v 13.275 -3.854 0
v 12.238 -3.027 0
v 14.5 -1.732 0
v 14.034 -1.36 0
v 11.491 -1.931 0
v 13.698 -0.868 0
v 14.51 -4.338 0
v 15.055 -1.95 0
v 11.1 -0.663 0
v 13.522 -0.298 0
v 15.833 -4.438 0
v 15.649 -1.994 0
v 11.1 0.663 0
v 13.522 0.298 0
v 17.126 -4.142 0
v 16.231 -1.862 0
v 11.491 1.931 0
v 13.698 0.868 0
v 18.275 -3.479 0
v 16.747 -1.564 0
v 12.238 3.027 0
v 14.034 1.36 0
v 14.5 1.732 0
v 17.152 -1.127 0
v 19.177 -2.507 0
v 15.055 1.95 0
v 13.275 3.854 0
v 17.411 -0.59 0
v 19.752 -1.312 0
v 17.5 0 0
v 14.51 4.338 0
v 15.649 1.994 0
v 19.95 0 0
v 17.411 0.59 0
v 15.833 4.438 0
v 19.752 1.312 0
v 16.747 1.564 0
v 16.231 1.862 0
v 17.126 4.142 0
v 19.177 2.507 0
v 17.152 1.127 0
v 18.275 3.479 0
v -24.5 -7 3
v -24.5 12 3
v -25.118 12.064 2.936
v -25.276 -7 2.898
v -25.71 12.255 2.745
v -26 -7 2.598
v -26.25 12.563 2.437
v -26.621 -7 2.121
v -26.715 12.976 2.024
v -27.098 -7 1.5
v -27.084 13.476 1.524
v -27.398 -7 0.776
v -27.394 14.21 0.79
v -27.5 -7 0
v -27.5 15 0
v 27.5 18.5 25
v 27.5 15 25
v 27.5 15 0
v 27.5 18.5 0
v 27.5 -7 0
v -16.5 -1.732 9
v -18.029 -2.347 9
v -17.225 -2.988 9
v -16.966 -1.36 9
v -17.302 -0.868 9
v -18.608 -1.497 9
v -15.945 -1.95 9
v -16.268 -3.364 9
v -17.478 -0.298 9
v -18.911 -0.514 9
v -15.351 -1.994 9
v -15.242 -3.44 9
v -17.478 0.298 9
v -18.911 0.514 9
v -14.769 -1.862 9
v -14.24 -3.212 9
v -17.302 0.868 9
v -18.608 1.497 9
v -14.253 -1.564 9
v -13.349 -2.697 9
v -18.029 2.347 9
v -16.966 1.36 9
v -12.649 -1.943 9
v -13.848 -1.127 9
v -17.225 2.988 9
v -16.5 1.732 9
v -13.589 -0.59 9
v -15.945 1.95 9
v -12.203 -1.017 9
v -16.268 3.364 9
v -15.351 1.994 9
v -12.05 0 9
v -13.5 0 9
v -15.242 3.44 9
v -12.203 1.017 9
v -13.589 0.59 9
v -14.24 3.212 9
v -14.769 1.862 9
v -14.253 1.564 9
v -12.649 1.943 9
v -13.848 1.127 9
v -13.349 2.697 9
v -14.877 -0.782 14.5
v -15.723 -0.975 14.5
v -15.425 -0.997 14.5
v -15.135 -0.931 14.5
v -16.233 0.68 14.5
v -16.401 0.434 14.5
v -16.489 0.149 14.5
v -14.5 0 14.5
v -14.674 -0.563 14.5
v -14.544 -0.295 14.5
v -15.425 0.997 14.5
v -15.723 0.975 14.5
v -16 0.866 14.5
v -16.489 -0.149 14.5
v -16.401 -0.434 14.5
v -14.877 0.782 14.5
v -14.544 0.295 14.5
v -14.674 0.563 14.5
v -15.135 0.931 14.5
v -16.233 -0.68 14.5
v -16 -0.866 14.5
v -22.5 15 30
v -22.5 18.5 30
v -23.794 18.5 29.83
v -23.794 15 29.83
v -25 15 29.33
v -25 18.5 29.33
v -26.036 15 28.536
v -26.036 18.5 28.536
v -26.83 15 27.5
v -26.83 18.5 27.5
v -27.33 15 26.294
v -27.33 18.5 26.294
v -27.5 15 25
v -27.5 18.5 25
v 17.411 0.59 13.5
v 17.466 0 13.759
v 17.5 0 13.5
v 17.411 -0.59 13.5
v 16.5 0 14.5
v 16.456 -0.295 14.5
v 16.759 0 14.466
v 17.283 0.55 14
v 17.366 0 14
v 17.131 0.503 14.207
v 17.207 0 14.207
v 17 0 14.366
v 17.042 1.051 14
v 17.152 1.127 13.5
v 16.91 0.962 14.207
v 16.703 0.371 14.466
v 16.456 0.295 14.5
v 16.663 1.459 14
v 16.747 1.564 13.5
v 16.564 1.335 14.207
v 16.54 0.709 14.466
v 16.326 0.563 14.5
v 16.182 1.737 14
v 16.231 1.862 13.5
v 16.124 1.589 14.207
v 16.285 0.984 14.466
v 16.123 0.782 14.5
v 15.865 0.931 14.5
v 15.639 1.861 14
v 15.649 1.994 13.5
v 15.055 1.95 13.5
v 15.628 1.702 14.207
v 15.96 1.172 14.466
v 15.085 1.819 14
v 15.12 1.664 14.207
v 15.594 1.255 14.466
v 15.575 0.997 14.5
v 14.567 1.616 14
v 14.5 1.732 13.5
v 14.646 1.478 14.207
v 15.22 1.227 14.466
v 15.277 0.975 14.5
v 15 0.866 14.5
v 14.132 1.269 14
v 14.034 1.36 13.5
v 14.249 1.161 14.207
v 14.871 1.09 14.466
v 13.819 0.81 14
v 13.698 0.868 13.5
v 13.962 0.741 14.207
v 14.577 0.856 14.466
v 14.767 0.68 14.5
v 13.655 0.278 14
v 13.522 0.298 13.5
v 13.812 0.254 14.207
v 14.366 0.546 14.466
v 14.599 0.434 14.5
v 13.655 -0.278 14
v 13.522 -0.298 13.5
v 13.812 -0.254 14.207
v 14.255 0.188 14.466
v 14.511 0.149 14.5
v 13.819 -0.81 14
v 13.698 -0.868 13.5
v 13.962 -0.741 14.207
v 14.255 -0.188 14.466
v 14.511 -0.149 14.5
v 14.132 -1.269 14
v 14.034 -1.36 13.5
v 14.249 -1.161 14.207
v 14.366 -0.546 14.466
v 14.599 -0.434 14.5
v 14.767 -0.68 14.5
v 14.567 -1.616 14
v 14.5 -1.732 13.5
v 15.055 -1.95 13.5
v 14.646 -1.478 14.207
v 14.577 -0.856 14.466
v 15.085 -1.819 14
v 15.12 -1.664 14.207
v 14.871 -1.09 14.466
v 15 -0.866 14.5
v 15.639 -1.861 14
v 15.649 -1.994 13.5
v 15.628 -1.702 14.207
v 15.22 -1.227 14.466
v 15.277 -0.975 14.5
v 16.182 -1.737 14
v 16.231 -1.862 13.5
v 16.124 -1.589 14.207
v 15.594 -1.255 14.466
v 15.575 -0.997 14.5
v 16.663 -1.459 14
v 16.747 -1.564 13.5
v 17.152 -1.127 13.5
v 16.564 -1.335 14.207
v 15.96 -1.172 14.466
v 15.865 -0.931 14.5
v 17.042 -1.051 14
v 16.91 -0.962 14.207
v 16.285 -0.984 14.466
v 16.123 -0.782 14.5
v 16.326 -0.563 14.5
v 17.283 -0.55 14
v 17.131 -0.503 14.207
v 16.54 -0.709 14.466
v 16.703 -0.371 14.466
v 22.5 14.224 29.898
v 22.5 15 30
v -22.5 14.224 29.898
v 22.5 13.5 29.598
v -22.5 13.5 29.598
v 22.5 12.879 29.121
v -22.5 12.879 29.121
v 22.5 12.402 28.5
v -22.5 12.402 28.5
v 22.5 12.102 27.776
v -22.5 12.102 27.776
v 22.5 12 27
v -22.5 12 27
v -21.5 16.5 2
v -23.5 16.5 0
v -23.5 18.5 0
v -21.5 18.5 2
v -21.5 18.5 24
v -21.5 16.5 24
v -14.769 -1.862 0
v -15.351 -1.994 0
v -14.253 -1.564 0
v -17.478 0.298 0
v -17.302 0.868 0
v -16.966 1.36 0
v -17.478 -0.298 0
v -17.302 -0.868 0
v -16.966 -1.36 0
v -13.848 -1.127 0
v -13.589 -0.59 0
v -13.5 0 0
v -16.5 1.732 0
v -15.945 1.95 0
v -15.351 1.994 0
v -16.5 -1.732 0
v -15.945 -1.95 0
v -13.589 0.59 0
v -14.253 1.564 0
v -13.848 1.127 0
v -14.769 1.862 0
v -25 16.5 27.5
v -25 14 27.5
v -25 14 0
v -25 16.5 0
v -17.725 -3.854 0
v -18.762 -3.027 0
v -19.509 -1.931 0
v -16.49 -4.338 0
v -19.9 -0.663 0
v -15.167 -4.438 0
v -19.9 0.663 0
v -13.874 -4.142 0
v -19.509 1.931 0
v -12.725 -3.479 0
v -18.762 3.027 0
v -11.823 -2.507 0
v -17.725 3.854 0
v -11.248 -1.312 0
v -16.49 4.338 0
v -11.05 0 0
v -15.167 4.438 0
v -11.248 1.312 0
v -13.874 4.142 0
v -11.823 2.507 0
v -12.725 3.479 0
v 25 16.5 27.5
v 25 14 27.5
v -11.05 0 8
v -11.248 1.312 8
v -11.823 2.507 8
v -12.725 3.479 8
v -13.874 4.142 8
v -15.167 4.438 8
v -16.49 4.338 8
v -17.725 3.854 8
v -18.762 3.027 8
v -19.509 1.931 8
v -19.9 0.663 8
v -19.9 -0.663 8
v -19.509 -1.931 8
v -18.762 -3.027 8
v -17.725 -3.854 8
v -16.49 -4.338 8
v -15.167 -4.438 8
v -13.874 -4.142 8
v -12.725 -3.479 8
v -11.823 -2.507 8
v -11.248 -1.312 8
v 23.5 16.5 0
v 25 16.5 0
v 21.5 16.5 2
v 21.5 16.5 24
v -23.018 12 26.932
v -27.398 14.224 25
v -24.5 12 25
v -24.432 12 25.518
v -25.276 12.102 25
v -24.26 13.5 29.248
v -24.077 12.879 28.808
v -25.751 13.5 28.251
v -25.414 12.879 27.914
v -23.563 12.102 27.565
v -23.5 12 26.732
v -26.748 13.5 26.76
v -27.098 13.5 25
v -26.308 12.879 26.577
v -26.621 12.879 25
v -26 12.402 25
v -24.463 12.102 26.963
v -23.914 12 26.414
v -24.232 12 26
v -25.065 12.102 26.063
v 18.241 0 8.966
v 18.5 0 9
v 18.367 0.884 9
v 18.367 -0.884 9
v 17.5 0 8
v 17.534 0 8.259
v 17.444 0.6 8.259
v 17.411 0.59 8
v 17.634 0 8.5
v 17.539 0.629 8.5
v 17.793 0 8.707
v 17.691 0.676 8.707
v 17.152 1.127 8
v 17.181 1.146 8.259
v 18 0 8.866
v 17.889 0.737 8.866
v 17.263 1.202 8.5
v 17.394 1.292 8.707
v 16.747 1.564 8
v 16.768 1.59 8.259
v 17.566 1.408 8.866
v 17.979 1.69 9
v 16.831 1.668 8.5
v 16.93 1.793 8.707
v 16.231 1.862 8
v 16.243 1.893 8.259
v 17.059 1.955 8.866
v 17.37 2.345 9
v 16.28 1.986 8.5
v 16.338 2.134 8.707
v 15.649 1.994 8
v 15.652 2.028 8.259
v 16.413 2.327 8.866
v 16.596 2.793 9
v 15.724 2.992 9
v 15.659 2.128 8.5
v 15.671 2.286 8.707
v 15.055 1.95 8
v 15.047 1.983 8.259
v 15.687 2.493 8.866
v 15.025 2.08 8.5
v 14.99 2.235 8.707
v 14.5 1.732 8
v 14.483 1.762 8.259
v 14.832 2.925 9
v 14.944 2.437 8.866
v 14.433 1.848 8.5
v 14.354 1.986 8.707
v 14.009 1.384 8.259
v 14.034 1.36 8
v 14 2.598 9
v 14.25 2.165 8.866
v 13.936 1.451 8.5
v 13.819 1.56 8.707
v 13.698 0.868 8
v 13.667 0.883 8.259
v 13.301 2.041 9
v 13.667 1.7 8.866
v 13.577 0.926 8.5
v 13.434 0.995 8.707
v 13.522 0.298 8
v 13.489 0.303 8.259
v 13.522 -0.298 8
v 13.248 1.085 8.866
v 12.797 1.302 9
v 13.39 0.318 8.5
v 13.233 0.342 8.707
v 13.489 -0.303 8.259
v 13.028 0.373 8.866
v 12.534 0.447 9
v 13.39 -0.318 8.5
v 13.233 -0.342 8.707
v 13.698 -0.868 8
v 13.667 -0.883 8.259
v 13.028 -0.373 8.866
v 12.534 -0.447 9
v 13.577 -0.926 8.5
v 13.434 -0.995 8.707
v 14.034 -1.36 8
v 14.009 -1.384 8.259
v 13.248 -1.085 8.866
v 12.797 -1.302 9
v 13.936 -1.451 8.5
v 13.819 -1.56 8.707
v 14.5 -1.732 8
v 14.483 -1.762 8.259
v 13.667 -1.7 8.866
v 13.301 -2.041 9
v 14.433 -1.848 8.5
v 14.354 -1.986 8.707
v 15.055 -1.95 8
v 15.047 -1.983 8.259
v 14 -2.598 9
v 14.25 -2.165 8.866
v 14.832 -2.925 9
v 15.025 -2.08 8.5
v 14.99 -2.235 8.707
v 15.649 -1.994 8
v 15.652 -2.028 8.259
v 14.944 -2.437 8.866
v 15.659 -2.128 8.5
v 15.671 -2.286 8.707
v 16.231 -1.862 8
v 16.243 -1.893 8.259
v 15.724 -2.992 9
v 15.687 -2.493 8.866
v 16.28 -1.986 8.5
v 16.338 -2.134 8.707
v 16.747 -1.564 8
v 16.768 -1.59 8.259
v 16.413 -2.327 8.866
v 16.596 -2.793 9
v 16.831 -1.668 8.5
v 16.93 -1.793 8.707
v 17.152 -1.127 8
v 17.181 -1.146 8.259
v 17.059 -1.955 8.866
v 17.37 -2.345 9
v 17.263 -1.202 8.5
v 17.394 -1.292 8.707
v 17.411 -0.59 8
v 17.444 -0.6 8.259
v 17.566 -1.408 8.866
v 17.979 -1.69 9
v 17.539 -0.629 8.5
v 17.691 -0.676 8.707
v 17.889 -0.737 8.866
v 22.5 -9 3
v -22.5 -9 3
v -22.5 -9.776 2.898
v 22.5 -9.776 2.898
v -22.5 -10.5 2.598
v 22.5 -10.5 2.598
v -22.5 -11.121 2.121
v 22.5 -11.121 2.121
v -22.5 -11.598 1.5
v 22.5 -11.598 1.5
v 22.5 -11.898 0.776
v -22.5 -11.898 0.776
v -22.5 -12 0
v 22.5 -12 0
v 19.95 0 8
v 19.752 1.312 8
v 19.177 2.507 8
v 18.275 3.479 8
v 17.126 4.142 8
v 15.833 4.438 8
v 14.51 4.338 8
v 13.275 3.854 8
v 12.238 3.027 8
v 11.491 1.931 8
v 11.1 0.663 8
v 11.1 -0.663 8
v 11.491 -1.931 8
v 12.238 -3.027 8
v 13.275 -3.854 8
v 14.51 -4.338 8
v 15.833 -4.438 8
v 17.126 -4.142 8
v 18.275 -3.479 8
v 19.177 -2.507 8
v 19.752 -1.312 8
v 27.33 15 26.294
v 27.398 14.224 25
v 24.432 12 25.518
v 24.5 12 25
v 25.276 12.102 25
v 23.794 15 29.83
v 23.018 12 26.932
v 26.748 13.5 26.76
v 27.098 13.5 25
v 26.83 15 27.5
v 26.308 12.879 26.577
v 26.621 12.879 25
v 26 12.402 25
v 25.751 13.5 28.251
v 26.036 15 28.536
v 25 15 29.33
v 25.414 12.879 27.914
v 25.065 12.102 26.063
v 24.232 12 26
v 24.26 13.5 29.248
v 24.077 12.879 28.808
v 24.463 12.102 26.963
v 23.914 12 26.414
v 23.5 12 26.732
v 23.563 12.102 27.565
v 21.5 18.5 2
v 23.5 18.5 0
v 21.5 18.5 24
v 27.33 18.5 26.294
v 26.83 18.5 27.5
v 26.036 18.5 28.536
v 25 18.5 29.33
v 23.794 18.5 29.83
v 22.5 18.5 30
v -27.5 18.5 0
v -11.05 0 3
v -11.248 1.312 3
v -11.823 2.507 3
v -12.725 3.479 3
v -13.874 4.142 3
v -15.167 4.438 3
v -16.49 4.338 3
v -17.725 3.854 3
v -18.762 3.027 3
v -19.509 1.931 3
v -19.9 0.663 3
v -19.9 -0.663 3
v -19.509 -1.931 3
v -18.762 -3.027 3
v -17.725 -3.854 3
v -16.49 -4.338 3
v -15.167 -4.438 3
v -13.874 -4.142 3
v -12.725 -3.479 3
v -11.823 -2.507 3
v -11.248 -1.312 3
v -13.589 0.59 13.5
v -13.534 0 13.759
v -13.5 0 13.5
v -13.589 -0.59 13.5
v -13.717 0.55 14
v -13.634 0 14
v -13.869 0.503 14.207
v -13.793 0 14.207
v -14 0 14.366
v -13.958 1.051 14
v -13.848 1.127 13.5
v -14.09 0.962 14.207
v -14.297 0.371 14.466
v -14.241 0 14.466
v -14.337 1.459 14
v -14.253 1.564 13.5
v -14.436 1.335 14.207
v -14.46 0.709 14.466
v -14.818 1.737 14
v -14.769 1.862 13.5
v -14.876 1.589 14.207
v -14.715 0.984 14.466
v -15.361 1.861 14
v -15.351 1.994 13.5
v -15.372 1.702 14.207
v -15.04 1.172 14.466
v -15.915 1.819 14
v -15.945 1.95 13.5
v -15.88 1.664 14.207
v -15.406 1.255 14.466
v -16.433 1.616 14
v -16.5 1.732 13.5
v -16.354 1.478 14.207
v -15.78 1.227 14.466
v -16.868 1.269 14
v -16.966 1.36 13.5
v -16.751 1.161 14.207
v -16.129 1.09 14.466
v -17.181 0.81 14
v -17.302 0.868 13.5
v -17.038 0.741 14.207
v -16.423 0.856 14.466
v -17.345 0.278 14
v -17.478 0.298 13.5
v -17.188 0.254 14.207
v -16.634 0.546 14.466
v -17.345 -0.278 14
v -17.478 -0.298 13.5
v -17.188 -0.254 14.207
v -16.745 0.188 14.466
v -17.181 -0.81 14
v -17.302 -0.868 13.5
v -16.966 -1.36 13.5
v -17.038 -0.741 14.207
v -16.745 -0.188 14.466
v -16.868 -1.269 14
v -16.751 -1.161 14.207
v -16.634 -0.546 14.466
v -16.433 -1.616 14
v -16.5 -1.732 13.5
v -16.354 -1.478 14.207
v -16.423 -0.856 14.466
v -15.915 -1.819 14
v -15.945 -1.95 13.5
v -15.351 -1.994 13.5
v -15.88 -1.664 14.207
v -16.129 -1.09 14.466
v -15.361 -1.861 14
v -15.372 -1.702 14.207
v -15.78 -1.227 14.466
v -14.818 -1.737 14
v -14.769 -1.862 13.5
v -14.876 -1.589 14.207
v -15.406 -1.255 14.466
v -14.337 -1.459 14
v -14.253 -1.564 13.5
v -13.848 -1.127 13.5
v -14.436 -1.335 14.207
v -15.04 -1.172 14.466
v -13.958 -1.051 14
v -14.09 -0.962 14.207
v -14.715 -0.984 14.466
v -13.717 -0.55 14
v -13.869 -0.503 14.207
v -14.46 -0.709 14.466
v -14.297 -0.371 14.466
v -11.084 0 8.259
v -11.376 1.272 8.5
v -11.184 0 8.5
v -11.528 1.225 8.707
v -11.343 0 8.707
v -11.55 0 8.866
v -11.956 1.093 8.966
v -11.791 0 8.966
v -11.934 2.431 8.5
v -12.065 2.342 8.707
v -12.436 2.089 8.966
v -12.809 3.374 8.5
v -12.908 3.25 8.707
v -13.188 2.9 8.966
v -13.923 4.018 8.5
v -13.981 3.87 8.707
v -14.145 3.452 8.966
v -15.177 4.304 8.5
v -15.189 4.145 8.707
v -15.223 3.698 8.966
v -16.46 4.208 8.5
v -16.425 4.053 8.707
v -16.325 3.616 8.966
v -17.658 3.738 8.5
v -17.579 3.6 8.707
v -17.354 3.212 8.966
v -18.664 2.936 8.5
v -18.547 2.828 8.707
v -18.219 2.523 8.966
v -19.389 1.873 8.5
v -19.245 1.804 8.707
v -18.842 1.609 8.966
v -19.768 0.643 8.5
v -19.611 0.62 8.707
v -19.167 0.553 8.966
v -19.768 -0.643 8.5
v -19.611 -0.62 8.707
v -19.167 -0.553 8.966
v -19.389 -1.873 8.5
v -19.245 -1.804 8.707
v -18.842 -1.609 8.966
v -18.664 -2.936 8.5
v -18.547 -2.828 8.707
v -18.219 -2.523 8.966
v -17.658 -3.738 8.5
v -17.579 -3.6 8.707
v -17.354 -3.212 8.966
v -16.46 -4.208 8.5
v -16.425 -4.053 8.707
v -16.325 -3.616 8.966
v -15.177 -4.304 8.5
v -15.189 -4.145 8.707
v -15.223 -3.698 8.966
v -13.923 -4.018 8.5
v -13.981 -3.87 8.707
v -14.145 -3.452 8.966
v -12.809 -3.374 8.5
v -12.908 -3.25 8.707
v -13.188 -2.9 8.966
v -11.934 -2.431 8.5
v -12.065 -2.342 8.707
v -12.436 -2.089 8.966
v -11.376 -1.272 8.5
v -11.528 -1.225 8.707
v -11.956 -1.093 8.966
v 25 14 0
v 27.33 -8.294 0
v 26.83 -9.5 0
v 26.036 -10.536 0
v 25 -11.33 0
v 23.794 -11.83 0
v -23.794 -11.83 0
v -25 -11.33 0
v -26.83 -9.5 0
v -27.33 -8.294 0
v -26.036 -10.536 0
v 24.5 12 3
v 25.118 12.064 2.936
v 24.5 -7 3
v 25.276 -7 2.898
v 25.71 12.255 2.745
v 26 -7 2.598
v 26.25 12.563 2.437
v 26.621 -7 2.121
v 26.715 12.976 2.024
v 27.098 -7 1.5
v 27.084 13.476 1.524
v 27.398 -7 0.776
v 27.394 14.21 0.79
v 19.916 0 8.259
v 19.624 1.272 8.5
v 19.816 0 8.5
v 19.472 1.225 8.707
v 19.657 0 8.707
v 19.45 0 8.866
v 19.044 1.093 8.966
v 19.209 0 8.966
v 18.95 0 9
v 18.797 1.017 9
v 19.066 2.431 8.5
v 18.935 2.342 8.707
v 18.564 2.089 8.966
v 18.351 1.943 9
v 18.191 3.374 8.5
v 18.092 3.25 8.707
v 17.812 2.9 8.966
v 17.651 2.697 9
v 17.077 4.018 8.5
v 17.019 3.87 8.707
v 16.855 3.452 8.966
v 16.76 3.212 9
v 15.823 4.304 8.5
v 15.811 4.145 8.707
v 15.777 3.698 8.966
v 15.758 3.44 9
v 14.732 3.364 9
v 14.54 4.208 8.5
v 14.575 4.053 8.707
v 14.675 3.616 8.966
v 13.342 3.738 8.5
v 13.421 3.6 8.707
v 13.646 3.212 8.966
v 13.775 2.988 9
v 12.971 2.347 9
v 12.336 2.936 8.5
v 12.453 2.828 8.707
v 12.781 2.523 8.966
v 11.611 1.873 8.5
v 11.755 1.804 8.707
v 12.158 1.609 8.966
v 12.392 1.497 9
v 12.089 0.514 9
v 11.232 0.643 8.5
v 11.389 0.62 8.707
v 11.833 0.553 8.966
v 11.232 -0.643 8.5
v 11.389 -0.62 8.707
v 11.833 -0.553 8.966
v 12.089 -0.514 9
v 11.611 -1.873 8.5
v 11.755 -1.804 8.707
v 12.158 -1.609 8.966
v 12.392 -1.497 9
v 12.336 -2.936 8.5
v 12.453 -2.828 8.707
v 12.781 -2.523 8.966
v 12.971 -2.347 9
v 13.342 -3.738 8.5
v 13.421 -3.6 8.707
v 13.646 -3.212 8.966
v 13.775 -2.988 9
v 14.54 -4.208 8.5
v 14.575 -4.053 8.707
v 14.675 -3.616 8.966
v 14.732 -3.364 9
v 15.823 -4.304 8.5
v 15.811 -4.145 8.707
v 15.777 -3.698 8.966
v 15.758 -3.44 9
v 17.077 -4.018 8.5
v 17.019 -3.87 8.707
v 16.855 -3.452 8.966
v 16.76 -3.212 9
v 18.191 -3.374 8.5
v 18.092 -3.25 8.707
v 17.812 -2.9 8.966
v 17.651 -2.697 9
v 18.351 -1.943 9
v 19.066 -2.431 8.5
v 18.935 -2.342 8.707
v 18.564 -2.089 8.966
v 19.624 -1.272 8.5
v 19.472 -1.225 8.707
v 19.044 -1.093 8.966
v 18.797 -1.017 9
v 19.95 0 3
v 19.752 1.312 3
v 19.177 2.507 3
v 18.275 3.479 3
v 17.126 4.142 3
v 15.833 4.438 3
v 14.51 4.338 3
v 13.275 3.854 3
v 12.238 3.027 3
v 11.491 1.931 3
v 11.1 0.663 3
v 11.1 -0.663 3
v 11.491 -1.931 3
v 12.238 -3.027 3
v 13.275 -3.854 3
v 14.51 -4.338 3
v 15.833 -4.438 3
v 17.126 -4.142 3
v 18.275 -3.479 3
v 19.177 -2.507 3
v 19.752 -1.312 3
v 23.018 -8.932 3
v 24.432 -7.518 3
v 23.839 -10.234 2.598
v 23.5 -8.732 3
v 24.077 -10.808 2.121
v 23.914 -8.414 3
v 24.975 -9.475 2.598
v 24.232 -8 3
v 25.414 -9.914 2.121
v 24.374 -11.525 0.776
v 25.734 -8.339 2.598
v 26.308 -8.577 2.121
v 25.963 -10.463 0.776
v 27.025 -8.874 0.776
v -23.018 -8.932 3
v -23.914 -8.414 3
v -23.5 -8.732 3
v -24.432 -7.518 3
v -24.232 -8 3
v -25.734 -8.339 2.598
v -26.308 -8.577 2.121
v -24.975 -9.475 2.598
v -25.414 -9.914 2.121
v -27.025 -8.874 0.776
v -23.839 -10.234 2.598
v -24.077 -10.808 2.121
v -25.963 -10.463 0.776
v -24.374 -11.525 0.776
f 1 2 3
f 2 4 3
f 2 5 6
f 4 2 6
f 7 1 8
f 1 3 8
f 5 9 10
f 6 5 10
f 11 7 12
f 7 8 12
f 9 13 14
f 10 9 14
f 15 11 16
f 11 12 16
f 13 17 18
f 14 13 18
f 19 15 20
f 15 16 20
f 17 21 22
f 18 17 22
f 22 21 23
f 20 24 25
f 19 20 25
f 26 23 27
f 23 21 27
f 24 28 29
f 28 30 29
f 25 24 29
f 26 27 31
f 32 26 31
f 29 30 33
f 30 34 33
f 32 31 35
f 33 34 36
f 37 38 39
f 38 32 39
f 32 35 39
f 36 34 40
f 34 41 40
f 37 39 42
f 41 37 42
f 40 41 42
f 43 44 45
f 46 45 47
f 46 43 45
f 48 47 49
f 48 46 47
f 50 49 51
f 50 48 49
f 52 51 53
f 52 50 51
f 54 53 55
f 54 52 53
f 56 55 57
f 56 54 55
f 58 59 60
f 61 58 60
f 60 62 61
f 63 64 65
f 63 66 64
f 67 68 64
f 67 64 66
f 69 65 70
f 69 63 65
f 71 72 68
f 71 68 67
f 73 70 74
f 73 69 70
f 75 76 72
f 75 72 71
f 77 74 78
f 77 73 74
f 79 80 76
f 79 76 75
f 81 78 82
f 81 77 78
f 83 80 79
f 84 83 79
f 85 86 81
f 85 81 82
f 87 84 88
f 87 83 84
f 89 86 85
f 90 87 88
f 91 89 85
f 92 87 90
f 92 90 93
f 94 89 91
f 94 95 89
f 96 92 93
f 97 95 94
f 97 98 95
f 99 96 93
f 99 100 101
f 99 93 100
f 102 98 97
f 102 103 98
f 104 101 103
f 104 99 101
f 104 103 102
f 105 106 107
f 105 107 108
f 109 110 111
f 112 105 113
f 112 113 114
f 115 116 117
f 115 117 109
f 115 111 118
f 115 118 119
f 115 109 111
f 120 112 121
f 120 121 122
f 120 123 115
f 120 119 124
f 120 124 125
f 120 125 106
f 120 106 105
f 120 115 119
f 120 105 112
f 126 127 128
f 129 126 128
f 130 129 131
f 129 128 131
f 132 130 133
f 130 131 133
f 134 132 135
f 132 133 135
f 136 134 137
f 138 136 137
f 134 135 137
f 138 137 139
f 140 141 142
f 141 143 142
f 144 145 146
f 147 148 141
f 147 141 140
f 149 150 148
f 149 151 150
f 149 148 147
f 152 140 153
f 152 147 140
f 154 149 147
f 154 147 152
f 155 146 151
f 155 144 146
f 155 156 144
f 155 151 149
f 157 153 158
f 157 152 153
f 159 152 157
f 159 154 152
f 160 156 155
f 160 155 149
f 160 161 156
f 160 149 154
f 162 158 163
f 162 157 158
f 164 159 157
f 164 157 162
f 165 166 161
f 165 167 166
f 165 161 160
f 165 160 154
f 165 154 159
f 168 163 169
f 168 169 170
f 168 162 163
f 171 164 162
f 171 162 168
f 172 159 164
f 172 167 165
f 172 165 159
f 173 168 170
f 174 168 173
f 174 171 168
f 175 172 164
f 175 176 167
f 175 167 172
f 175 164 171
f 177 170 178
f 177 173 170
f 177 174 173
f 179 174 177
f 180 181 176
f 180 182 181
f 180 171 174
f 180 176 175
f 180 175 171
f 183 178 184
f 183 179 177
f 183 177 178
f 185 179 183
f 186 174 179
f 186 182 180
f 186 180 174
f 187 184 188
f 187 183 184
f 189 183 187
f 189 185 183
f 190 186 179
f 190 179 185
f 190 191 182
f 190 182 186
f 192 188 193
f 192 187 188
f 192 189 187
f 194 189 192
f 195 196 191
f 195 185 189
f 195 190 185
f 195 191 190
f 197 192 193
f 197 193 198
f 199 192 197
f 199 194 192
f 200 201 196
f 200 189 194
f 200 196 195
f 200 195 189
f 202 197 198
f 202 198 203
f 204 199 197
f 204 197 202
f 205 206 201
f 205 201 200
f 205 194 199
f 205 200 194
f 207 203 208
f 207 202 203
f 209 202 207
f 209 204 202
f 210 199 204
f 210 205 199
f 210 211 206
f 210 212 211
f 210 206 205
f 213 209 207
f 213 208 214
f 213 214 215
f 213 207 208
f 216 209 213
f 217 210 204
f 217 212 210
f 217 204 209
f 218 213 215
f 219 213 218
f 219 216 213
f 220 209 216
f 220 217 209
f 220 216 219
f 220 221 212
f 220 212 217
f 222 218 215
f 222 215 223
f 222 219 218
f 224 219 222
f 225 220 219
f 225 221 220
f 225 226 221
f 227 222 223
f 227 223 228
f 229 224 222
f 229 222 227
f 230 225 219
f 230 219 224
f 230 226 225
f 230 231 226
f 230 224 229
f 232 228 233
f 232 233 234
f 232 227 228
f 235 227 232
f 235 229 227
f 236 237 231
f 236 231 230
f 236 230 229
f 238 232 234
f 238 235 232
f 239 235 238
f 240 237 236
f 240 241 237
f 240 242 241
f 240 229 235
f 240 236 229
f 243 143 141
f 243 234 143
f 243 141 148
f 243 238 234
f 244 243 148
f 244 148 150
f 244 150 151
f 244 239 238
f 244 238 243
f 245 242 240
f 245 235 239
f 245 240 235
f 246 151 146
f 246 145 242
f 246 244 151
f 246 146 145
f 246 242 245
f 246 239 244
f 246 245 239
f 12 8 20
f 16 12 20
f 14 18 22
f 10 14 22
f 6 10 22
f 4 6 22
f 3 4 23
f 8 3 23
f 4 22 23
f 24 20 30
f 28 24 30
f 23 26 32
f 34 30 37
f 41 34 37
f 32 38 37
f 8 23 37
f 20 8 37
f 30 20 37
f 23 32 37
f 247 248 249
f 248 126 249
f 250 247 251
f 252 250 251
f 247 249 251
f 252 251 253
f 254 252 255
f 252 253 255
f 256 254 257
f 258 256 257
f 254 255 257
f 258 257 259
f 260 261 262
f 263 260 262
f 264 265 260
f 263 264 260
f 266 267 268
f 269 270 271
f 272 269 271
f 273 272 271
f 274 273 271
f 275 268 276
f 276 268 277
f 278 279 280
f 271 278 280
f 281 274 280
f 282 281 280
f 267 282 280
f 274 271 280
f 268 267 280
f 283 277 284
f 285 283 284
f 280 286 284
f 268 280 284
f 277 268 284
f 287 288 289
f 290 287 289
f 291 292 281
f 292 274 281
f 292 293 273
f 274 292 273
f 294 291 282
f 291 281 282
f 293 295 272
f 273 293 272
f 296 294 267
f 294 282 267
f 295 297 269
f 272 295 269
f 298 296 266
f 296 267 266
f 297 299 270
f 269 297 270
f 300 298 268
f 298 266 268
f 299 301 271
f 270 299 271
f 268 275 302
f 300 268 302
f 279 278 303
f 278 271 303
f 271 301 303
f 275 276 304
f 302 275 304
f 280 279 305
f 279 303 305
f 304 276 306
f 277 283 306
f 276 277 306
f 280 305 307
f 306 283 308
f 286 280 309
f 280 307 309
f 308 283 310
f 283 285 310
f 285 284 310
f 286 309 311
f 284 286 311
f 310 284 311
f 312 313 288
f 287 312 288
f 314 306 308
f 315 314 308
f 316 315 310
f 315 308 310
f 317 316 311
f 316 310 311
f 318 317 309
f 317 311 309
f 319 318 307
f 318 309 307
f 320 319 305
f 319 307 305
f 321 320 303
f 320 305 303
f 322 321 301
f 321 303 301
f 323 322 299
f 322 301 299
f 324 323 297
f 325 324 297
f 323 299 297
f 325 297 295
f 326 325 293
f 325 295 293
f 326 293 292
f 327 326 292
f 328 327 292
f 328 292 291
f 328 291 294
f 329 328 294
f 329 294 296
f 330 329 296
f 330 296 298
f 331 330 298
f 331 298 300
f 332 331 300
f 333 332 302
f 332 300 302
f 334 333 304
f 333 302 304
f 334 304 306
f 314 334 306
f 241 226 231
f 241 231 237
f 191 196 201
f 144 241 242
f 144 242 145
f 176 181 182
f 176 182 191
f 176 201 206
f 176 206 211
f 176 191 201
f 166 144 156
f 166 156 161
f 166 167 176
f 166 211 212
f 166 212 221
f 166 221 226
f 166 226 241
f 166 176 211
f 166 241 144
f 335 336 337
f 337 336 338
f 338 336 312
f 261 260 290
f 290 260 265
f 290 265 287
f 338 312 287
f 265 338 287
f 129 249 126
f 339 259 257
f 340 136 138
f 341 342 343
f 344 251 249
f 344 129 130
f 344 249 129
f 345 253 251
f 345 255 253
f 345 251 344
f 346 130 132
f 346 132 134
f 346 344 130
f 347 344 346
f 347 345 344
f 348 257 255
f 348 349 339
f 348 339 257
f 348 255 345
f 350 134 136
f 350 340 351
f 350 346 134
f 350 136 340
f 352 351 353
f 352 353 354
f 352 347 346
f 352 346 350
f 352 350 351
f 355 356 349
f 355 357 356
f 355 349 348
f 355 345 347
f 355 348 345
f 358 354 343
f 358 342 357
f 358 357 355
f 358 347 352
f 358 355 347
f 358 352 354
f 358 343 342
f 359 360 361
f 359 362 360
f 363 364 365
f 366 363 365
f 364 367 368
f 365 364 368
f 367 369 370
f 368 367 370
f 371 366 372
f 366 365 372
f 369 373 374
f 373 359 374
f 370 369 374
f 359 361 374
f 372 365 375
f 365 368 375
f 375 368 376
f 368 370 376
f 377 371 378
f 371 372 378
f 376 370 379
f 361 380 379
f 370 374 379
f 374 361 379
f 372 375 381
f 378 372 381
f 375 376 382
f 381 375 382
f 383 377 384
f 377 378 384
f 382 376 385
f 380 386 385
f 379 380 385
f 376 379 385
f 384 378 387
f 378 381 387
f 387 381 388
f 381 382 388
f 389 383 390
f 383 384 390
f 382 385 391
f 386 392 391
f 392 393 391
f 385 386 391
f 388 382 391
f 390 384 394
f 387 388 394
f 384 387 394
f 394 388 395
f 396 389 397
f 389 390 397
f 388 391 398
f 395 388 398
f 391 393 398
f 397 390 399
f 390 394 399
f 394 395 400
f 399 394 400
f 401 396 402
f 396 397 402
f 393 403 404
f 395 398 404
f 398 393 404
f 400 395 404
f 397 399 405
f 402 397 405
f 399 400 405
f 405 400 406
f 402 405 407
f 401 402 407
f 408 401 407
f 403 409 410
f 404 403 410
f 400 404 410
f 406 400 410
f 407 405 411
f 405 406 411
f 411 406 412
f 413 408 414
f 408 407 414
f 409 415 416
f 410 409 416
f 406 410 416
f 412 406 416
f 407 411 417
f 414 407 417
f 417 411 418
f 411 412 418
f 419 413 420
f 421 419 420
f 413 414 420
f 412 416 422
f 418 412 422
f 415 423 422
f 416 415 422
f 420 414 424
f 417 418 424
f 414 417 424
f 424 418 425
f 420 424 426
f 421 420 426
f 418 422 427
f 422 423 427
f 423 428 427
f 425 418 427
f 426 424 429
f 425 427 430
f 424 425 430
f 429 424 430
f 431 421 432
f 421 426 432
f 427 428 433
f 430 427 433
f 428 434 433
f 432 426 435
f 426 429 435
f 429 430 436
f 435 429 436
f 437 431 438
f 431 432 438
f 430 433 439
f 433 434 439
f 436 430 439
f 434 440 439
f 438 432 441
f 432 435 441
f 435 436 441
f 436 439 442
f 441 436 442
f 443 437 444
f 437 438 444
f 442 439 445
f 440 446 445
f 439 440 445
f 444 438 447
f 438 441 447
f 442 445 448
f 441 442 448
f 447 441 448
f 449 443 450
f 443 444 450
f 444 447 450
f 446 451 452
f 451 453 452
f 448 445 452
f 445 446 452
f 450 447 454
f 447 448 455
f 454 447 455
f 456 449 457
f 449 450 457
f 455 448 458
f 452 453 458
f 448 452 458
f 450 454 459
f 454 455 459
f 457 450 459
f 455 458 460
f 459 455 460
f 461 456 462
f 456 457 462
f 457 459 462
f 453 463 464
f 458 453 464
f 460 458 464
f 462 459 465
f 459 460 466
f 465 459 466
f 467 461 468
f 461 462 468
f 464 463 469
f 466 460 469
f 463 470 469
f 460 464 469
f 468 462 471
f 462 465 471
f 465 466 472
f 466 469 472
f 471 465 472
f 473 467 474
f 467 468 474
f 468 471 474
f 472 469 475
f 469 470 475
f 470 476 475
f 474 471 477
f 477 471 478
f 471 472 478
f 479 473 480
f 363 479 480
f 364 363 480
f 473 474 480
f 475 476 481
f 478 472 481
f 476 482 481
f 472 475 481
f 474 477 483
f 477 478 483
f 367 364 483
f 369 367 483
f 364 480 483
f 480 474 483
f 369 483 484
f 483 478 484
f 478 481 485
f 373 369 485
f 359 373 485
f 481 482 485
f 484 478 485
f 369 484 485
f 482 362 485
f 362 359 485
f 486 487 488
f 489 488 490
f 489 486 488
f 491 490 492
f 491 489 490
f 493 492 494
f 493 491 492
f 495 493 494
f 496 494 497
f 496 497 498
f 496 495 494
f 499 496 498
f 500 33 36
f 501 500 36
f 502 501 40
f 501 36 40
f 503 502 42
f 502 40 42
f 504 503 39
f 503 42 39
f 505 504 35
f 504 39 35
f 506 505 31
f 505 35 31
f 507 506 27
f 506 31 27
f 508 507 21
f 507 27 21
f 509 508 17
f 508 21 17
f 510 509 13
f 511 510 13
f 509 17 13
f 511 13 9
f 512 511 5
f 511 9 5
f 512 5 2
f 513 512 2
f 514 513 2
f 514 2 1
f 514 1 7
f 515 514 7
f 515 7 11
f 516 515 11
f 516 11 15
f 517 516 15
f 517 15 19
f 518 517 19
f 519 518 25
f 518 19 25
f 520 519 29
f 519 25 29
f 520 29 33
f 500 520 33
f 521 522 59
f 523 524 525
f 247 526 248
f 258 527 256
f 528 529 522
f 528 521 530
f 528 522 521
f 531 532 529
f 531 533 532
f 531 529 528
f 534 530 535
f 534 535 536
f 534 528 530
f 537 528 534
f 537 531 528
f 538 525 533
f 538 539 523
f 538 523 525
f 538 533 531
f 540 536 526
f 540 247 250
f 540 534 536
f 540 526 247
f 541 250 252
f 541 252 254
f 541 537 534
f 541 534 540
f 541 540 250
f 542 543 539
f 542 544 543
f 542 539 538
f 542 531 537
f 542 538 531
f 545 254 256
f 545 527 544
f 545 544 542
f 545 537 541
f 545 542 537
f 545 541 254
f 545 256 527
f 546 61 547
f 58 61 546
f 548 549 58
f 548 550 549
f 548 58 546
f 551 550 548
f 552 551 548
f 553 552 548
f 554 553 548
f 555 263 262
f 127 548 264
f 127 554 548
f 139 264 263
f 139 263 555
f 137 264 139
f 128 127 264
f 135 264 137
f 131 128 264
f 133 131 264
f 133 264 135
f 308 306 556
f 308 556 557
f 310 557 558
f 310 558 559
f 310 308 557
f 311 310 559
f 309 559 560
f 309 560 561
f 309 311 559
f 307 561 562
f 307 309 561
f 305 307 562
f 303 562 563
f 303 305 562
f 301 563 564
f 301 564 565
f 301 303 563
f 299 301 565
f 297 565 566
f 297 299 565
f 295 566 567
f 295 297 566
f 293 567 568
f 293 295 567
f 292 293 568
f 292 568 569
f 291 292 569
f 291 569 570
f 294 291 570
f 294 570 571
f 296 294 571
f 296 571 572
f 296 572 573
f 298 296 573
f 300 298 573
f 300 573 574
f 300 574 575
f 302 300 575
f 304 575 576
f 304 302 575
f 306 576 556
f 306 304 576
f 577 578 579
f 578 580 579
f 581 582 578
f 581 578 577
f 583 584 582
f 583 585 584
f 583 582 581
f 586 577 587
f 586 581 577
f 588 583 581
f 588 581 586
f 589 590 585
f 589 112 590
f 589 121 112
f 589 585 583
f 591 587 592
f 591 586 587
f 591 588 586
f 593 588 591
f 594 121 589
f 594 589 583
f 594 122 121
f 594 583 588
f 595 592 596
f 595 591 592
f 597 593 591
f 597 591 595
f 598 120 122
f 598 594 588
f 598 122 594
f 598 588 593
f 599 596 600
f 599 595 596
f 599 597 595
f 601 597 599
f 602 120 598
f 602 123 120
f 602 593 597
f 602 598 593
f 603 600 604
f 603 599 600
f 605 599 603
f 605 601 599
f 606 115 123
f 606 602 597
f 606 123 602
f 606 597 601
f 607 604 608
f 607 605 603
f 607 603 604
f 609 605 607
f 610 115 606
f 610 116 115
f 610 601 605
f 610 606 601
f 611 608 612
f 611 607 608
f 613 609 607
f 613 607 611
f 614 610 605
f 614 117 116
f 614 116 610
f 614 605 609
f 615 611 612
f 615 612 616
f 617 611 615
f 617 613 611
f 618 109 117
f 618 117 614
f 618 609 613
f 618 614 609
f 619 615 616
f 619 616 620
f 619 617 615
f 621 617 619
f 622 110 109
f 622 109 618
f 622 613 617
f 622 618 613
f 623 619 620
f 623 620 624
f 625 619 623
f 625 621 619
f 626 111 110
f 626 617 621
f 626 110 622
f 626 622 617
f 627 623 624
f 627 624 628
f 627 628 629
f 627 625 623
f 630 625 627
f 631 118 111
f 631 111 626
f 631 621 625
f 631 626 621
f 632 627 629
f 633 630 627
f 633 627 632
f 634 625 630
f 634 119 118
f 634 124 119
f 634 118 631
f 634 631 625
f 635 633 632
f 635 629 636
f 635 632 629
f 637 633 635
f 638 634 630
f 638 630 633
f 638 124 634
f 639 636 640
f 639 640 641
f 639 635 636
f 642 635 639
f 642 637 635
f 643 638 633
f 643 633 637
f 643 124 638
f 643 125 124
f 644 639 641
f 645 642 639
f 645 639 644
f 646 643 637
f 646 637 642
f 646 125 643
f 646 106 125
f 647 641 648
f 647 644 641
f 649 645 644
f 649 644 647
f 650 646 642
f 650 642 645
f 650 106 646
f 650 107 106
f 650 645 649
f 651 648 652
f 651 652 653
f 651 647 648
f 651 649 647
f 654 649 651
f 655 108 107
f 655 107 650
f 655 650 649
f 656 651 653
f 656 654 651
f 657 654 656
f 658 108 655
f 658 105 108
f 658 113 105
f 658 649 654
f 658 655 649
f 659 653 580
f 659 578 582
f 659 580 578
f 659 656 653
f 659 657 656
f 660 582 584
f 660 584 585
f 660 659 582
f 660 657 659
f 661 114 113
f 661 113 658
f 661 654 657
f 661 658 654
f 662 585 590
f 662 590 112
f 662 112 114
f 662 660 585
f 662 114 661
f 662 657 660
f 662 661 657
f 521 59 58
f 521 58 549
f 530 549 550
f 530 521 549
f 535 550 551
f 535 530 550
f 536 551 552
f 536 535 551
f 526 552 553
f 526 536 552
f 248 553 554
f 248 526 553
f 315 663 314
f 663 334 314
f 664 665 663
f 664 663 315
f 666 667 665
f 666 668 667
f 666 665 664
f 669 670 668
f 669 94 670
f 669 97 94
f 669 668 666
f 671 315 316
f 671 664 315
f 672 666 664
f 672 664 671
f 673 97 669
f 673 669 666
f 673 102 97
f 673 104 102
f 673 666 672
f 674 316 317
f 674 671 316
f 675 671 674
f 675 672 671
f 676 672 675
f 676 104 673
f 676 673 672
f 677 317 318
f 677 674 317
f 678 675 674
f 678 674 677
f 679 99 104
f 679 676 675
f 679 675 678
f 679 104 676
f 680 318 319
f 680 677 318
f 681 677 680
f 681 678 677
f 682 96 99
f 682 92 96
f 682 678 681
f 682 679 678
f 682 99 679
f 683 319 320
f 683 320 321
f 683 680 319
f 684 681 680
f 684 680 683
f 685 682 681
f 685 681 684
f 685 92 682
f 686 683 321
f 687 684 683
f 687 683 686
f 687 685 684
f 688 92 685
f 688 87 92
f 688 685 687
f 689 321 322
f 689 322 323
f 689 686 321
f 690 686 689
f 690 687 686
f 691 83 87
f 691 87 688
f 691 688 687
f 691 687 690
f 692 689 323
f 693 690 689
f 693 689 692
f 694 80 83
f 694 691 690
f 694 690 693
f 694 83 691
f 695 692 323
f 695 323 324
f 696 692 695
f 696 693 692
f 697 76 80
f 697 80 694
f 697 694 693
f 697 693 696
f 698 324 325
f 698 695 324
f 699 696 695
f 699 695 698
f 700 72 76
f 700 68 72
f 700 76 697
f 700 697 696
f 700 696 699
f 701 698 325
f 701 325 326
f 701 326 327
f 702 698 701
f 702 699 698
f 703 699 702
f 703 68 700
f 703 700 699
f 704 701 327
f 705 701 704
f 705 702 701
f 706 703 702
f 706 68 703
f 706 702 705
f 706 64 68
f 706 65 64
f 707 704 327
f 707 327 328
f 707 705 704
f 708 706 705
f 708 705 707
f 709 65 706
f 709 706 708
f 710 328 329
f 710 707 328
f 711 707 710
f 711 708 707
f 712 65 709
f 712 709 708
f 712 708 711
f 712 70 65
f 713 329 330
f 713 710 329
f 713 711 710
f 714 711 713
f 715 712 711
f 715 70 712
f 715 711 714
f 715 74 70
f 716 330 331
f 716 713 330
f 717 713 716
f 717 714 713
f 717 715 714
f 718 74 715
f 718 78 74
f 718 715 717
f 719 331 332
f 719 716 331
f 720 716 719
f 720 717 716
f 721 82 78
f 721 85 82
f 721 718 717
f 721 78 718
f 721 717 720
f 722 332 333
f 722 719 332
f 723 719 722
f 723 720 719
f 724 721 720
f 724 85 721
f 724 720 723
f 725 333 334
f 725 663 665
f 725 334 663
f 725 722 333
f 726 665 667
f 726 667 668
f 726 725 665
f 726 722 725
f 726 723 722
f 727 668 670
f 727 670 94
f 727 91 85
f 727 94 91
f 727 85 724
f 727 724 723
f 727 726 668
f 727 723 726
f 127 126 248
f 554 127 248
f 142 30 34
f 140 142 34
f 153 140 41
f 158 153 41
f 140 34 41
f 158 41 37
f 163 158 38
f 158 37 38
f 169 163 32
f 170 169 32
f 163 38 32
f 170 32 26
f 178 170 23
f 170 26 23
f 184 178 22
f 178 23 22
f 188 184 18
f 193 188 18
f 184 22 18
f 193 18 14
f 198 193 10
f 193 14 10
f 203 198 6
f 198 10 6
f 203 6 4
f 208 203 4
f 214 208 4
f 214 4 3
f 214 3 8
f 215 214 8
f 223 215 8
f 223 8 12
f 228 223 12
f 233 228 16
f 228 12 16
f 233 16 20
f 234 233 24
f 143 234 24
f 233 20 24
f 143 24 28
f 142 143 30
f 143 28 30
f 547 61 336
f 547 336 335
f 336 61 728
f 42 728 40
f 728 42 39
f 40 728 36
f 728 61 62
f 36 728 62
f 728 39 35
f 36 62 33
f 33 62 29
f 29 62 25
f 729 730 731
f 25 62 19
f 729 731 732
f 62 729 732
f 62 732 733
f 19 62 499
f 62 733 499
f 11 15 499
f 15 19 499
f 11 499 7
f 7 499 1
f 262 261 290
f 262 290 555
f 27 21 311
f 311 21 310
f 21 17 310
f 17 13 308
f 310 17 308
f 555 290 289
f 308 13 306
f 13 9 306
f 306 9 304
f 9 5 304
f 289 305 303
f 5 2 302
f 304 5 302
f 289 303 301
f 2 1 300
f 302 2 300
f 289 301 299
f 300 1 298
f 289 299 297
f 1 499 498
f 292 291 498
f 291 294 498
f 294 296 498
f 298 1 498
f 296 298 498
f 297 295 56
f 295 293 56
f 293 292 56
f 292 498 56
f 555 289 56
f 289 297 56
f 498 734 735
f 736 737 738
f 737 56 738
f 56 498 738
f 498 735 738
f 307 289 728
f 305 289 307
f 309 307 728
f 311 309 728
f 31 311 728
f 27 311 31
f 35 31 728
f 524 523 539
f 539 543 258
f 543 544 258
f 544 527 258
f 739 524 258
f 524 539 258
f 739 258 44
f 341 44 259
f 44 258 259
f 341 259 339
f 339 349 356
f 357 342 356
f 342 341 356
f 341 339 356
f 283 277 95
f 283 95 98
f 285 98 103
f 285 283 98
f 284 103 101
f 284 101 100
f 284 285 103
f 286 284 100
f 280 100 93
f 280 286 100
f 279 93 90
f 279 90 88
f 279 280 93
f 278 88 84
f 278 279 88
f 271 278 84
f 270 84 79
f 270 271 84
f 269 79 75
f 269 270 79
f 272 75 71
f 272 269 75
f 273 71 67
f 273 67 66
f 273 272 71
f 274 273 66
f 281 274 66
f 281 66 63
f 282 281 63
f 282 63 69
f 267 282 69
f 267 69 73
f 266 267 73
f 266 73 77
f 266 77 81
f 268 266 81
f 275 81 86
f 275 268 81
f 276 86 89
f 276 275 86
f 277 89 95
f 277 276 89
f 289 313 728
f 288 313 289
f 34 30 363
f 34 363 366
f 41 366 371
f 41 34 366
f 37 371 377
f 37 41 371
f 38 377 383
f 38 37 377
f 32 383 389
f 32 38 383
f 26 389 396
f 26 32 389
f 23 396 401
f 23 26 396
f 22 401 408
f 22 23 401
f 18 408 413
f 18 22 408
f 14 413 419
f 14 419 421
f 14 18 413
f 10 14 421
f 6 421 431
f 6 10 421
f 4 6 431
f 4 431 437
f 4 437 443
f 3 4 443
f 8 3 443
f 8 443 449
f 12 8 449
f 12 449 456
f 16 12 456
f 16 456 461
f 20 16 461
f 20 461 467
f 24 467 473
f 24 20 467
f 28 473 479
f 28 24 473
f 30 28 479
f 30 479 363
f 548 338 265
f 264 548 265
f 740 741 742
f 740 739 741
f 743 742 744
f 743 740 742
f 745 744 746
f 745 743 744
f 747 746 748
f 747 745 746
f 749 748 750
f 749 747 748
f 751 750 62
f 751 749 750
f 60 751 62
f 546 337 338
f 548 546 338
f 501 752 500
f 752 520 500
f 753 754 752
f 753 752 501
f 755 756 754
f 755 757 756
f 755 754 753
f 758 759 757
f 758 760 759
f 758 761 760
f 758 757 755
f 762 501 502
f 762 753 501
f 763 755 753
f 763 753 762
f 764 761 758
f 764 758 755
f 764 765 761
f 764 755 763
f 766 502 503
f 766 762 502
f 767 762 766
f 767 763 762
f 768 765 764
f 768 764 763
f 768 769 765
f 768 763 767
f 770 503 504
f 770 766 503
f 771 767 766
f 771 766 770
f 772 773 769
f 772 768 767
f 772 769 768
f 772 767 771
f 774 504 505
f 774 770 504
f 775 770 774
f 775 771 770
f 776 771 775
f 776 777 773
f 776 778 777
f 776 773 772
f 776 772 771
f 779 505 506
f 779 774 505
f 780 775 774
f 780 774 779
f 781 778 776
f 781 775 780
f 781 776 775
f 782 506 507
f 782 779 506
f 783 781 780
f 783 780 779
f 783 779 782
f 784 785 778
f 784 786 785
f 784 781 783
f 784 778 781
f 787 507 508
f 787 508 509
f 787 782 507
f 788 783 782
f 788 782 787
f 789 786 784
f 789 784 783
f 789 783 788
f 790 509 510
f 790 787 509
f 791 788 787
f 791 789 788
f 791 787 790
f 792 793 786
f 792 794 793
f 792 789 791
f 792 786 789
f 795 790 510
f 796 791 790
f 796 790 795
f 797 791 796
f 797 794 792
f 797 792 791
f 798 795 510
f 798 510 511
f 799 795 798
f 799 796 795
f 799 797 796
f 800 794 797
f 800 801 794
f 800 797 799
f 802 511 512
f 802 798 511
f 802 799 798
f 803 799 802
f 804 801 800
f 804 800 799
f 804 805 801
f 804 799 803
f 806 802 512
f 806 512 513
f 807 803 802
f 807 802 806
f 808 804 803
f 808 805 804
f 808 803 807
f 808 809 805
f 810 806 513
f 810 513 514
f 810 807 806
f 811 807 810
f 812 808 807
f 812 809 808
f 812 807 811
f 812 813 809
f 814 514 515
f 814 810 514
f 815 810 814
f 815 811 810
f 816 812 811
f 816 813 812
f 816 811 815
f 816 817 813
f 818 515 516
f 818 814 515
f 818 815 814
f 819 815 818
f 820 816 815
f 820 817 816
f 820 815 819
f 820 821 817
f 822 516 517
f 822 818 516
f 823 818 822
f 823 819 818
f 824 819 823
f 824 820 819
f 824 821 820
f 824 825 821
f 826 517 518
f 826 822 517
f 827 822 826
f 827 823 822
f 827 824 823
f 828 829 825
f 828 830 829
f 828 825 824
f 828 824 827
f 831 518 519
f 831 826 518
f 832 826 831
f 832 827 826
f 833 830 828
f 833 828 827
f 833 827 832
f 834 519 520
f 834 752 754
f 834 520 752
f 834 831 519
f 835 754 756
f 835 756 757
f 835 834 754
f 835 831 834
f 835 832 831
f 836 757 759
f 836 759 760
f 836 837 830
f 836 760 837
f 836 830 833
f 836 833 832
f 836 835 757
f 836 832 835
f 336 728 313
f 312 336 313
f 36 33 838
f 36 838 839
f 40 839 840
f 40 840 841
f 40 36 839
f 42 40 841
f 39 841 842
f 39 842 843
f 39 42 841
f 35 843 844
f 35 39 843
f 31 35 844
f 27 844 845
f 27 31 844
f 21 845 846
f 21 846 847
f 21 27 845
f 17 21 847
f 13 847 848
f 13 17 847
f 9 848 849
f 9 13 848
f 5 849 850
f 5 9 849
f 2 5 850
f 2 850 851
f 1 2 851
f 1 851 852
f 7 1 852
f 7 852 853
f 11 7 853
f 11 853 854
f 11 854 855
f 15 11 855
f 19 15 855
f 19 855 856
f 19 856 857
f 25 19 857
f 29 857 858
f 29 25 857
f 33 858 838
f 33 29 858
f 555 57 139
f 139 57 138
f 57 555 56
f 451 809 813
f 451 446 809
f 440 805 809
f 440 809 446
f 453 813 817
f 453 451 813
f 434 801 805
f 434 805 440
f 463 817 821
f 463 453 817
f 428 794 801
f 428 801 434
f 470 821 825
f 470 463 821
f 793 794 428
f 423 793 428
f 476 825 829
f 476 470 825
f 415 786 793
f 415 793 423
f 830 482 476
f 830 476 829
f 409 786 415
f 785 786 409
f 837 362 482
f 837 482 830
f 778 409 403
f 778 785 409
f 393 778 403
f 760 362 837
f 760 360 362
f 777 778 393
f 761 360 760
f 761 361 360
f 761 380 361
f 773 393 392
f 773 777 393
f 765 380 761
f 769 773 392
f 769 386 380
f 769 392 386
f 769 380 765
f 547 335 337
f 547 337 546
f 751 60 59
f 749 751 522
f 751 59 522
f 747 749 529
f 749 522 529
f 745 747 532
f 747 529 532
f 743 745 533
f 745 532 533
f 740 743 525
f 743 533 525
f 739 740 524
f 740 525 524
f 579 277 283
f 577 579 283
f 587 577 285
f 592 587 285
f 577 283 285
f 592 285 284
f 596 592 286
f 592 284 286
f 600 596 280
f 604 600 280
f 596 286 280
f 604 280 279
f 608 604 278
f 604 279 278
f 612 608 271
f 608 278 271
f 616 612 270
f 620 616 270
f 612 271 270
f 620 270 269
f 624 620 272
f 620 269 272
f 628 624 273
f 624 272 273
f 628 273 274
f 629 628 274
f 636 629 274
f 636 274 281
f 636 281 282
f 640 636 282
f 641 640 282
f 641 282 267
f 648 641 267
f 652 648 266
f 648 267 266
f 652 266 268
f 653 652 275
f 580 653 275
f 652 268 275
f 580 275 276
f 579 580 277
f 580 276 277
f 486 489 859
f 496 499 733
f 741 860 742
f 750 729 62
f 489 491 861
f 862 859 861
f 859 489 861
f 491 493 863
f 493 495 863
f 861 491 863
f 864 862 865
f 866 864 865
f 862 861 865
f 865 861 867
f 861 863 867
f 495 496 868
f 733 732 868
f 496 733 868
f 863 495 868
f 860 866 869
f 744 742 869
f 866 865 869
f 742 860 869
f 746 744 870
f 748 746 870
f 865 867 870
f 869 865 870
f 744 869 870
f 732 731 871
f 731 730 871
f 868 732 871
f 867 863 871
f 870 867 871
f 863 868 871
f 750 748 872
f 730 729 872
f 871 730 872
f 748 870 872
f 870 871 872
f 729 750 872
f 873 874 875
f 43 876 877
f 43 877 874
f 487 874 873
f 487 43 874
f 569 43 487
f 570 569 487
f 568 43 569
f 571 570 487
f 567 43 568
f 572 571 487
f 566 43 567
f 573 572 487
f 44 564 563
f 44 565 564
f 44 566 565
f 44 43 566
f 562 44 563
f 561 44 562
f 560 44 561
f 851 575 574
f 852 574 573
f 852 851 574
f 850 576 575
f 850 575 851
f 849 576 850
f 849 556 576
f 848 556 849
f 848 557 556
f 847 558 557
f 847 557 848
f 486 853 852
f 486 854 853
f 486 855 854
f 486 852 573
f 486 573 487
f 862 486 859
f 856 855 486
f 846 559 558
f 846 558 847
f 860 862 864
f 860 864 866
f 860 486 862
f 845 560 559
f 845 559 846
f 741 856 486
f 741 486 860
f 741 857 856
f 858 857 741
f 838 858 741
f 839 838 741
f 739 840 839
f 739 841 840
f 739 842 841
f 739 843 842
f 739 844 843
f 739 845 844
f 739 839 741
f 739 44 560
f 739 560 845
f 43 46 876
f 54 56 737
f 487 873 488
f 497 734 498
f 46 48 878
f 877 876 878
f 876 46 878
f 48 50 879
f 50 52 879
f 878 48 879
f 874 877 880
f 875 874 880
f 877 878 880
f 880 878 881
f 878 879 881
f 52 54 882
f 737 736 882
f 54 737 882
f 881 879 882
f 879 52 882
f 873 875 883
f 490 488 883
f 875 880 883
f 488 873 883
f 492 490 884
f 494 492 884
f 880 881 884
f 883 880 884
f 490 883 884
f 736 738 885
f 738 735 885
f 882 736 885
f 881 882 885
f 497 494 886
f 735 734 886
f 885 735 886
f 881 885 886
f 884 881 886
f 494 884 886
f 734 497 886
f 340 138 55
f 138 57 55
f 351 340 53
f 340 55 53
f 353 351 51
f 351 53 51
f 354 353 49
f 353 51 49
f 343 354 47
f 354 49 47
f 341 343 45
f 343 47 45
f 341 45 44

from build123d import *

# Parameters (mm, degrees)
F0_R     = 2
F1_DEPTH = 14.5
F0_R_2   = 4.45
F2_DEPTH = 9
F0_W     = 55
F0_H     = 24
F3_DEPTH = 3
F4_W     = 55
F4_H     = 27
F4_H_2   = 3
F5_DEPTH = 2
F7_DEPTH = 2.5
F9_DEPTH = 2
F10_R    = 5
F11_R    = 2.99999
F12_R    = 1
F12_2_R  = 1
F12_3_R  = 1
F12_4_R  = 1
F13_SIZE = 2


# Not quite as in the source:
# - a fillet or chamfer is up to 0.001 mm smaller than in the source, because OpenCascade refuses the exact size


with BuildPart() as f1:
    # F0 (on Top) → F1 (new body)
    with BuildSketch(Plane.XY):
        with Locations((-15.5, 0)):
            Circle(F0_R)
    extrude(amount=F1_DEPTH)

    # F12
    f12_edges = [f1.edges().sort_by_distance(p)[0] for p in [
        (-17.5, 0, 14.5),
    ]]
    fillet(f12_edges, radius=F12_R)


with BuildPart() as f1b:
    # F0 (on Top) → F1, piece 2 (new body)
    with BuildSketch(Plane.XY):
        with Locations((15.5, 0)):
            Circle(F0_R)
    extrude(amount=F1_DEPTH)

    # F12#3
    f12_3_edges = [f1b.edges().sort_by_distance(p)[0] for p in [
        (13.5, 0, 14.5),
    ]]
    fillet(f12_3_edges, radius=F12_3_R)


with BuildPart() as f2:
    # F0 (on Top) → F2 (new body)
    with BuildSketch(Plane.XY):
        with Locations((15.5, 0)):
            Circle(F0_R_2)
        with Locations((15.5, 0)):
            Circle(F0_R, mode=Mode.SUBTRACT)
    extrude(amount=F2_DEPTH)

    # F12#4
    f12_4_edges = [f2.edges().sort_by_distance(p)[0] for p in [
        (11.05, 0, 9),
        (13.5, 0, 9),
    ]]
    fillet(f12_4_edges, radius=F12_4_R)


with BuildPart() as f2b:
    # F0 (on Top) → F2, piece 2 (new body)
    with BuildSketch(Plane.XY):
        with Locations((-15.5, 0)):
            Circle(F0_R_2)
        with Locations((-15.5, 0)):
            Circle(F0_R, mode=Mode.SUBTRACT)
    extrude(amount=F2_DEPTH)

    # F12#2
    f12_2_edges = [f2b.edges().sort_by_distance(p)[0] for p in [
        (-19.95, 0, 9),
    ]]
    fillet(f12_2_edges, radius=F12_2_R)


with BuildPart() as f3:
    # F0 (on Top) → F3 (new body)
    with BuildSketch(Plane.XY):
        Rectangle(F0_W, F0_H)
        with Locations((-15.5, 0)):
            Circle(F0_R_2, mode=Mode.SUBTRACT)
        with Locations((15.5, 0)):
            Circle(F0_R_2, mode=Mode.SUBTRACT)
    extrude(amount=F3_DEPTH)

    # F4 (on face) → F5 (join)
    with BuildSketch(Plane(origin=(0, 12, 0), x_dir=(-1, 0, 0), z_dir=(0, 1, 0))):
        with Locations((0, 16.5)):
            Rectangle(F4_W, F4_H)
        with Locations((0, 1.5)):
            Rectangle(F4_W, F4_H_2)
    extrude(amount=F5_DEPTH)

    # F6 (on face) → F7 (join)
    with BuildSketch(Plane(origin=(0, 14, 0), x_dir=(-1, 0, 0), z_dir=(0, 1, 0))):
        Polygon((-27.5, 30), (-27.5, 0), (-25, 0), (-25, 27.5), (25, 27.5), (25, 0), (27.5, 0), (27.5, 30), align=None)
    extrude(amount=F7_DEPTH)

    # F8 (on face) → F9 (join)
    with BuildSketch(Plane(origin=(0, 16.5, 0), x_dir=(-1, 0, 0), z_dir=(0, 1, 0))):
        Polygon((-25, 27.5), (-25, 0), (-21.5, 0), (-21.5, 24), (21.5, 24), (21.5, 0), (25, 0), (25, 27.5), align=None)
        Polygon((-27.5, 30), (-27.5, 0), (-25, 0), (-25, 27.5), (25, 27.5), (25, 0), (27.5, 0), (27.5, 30), align=None)
    extrude(amount=F9_DEPTH)

    # F10
    f10_edges = [f3.edges().sort_by_distance(p)[0] for p in [
        (27.5, 15.25, 30),
        (-27.5, 15.25, 30),
        (-27.5, -12, 1.5),
        (27.5, -12, 1.5),
    ]]
    fillet(f10_edges, radius=F10_R)

    # F11 (radius 3 in the source; OpenCascade refuses exactly that, so slightly less here)
    f11_edges = [f3.edges().sort_by_distance(p)[0] for p in [
        (0, -12, 3),
        (0, 12, 30),
    ]]
    fillet(f11_edges, radius=F11_R)

    # F13
    f13_edges = [f3.edges().sort_by_distance(p)[0] for p in [
        (-21.5, 17.5, 0),
        (21.5, 17.5, 0),
    ]]
    chamfer(f13_edges, length=F13_SIZE)


solid = Compound([f1.part, f1b.part, f2.part, f2b.part, f3.part])
